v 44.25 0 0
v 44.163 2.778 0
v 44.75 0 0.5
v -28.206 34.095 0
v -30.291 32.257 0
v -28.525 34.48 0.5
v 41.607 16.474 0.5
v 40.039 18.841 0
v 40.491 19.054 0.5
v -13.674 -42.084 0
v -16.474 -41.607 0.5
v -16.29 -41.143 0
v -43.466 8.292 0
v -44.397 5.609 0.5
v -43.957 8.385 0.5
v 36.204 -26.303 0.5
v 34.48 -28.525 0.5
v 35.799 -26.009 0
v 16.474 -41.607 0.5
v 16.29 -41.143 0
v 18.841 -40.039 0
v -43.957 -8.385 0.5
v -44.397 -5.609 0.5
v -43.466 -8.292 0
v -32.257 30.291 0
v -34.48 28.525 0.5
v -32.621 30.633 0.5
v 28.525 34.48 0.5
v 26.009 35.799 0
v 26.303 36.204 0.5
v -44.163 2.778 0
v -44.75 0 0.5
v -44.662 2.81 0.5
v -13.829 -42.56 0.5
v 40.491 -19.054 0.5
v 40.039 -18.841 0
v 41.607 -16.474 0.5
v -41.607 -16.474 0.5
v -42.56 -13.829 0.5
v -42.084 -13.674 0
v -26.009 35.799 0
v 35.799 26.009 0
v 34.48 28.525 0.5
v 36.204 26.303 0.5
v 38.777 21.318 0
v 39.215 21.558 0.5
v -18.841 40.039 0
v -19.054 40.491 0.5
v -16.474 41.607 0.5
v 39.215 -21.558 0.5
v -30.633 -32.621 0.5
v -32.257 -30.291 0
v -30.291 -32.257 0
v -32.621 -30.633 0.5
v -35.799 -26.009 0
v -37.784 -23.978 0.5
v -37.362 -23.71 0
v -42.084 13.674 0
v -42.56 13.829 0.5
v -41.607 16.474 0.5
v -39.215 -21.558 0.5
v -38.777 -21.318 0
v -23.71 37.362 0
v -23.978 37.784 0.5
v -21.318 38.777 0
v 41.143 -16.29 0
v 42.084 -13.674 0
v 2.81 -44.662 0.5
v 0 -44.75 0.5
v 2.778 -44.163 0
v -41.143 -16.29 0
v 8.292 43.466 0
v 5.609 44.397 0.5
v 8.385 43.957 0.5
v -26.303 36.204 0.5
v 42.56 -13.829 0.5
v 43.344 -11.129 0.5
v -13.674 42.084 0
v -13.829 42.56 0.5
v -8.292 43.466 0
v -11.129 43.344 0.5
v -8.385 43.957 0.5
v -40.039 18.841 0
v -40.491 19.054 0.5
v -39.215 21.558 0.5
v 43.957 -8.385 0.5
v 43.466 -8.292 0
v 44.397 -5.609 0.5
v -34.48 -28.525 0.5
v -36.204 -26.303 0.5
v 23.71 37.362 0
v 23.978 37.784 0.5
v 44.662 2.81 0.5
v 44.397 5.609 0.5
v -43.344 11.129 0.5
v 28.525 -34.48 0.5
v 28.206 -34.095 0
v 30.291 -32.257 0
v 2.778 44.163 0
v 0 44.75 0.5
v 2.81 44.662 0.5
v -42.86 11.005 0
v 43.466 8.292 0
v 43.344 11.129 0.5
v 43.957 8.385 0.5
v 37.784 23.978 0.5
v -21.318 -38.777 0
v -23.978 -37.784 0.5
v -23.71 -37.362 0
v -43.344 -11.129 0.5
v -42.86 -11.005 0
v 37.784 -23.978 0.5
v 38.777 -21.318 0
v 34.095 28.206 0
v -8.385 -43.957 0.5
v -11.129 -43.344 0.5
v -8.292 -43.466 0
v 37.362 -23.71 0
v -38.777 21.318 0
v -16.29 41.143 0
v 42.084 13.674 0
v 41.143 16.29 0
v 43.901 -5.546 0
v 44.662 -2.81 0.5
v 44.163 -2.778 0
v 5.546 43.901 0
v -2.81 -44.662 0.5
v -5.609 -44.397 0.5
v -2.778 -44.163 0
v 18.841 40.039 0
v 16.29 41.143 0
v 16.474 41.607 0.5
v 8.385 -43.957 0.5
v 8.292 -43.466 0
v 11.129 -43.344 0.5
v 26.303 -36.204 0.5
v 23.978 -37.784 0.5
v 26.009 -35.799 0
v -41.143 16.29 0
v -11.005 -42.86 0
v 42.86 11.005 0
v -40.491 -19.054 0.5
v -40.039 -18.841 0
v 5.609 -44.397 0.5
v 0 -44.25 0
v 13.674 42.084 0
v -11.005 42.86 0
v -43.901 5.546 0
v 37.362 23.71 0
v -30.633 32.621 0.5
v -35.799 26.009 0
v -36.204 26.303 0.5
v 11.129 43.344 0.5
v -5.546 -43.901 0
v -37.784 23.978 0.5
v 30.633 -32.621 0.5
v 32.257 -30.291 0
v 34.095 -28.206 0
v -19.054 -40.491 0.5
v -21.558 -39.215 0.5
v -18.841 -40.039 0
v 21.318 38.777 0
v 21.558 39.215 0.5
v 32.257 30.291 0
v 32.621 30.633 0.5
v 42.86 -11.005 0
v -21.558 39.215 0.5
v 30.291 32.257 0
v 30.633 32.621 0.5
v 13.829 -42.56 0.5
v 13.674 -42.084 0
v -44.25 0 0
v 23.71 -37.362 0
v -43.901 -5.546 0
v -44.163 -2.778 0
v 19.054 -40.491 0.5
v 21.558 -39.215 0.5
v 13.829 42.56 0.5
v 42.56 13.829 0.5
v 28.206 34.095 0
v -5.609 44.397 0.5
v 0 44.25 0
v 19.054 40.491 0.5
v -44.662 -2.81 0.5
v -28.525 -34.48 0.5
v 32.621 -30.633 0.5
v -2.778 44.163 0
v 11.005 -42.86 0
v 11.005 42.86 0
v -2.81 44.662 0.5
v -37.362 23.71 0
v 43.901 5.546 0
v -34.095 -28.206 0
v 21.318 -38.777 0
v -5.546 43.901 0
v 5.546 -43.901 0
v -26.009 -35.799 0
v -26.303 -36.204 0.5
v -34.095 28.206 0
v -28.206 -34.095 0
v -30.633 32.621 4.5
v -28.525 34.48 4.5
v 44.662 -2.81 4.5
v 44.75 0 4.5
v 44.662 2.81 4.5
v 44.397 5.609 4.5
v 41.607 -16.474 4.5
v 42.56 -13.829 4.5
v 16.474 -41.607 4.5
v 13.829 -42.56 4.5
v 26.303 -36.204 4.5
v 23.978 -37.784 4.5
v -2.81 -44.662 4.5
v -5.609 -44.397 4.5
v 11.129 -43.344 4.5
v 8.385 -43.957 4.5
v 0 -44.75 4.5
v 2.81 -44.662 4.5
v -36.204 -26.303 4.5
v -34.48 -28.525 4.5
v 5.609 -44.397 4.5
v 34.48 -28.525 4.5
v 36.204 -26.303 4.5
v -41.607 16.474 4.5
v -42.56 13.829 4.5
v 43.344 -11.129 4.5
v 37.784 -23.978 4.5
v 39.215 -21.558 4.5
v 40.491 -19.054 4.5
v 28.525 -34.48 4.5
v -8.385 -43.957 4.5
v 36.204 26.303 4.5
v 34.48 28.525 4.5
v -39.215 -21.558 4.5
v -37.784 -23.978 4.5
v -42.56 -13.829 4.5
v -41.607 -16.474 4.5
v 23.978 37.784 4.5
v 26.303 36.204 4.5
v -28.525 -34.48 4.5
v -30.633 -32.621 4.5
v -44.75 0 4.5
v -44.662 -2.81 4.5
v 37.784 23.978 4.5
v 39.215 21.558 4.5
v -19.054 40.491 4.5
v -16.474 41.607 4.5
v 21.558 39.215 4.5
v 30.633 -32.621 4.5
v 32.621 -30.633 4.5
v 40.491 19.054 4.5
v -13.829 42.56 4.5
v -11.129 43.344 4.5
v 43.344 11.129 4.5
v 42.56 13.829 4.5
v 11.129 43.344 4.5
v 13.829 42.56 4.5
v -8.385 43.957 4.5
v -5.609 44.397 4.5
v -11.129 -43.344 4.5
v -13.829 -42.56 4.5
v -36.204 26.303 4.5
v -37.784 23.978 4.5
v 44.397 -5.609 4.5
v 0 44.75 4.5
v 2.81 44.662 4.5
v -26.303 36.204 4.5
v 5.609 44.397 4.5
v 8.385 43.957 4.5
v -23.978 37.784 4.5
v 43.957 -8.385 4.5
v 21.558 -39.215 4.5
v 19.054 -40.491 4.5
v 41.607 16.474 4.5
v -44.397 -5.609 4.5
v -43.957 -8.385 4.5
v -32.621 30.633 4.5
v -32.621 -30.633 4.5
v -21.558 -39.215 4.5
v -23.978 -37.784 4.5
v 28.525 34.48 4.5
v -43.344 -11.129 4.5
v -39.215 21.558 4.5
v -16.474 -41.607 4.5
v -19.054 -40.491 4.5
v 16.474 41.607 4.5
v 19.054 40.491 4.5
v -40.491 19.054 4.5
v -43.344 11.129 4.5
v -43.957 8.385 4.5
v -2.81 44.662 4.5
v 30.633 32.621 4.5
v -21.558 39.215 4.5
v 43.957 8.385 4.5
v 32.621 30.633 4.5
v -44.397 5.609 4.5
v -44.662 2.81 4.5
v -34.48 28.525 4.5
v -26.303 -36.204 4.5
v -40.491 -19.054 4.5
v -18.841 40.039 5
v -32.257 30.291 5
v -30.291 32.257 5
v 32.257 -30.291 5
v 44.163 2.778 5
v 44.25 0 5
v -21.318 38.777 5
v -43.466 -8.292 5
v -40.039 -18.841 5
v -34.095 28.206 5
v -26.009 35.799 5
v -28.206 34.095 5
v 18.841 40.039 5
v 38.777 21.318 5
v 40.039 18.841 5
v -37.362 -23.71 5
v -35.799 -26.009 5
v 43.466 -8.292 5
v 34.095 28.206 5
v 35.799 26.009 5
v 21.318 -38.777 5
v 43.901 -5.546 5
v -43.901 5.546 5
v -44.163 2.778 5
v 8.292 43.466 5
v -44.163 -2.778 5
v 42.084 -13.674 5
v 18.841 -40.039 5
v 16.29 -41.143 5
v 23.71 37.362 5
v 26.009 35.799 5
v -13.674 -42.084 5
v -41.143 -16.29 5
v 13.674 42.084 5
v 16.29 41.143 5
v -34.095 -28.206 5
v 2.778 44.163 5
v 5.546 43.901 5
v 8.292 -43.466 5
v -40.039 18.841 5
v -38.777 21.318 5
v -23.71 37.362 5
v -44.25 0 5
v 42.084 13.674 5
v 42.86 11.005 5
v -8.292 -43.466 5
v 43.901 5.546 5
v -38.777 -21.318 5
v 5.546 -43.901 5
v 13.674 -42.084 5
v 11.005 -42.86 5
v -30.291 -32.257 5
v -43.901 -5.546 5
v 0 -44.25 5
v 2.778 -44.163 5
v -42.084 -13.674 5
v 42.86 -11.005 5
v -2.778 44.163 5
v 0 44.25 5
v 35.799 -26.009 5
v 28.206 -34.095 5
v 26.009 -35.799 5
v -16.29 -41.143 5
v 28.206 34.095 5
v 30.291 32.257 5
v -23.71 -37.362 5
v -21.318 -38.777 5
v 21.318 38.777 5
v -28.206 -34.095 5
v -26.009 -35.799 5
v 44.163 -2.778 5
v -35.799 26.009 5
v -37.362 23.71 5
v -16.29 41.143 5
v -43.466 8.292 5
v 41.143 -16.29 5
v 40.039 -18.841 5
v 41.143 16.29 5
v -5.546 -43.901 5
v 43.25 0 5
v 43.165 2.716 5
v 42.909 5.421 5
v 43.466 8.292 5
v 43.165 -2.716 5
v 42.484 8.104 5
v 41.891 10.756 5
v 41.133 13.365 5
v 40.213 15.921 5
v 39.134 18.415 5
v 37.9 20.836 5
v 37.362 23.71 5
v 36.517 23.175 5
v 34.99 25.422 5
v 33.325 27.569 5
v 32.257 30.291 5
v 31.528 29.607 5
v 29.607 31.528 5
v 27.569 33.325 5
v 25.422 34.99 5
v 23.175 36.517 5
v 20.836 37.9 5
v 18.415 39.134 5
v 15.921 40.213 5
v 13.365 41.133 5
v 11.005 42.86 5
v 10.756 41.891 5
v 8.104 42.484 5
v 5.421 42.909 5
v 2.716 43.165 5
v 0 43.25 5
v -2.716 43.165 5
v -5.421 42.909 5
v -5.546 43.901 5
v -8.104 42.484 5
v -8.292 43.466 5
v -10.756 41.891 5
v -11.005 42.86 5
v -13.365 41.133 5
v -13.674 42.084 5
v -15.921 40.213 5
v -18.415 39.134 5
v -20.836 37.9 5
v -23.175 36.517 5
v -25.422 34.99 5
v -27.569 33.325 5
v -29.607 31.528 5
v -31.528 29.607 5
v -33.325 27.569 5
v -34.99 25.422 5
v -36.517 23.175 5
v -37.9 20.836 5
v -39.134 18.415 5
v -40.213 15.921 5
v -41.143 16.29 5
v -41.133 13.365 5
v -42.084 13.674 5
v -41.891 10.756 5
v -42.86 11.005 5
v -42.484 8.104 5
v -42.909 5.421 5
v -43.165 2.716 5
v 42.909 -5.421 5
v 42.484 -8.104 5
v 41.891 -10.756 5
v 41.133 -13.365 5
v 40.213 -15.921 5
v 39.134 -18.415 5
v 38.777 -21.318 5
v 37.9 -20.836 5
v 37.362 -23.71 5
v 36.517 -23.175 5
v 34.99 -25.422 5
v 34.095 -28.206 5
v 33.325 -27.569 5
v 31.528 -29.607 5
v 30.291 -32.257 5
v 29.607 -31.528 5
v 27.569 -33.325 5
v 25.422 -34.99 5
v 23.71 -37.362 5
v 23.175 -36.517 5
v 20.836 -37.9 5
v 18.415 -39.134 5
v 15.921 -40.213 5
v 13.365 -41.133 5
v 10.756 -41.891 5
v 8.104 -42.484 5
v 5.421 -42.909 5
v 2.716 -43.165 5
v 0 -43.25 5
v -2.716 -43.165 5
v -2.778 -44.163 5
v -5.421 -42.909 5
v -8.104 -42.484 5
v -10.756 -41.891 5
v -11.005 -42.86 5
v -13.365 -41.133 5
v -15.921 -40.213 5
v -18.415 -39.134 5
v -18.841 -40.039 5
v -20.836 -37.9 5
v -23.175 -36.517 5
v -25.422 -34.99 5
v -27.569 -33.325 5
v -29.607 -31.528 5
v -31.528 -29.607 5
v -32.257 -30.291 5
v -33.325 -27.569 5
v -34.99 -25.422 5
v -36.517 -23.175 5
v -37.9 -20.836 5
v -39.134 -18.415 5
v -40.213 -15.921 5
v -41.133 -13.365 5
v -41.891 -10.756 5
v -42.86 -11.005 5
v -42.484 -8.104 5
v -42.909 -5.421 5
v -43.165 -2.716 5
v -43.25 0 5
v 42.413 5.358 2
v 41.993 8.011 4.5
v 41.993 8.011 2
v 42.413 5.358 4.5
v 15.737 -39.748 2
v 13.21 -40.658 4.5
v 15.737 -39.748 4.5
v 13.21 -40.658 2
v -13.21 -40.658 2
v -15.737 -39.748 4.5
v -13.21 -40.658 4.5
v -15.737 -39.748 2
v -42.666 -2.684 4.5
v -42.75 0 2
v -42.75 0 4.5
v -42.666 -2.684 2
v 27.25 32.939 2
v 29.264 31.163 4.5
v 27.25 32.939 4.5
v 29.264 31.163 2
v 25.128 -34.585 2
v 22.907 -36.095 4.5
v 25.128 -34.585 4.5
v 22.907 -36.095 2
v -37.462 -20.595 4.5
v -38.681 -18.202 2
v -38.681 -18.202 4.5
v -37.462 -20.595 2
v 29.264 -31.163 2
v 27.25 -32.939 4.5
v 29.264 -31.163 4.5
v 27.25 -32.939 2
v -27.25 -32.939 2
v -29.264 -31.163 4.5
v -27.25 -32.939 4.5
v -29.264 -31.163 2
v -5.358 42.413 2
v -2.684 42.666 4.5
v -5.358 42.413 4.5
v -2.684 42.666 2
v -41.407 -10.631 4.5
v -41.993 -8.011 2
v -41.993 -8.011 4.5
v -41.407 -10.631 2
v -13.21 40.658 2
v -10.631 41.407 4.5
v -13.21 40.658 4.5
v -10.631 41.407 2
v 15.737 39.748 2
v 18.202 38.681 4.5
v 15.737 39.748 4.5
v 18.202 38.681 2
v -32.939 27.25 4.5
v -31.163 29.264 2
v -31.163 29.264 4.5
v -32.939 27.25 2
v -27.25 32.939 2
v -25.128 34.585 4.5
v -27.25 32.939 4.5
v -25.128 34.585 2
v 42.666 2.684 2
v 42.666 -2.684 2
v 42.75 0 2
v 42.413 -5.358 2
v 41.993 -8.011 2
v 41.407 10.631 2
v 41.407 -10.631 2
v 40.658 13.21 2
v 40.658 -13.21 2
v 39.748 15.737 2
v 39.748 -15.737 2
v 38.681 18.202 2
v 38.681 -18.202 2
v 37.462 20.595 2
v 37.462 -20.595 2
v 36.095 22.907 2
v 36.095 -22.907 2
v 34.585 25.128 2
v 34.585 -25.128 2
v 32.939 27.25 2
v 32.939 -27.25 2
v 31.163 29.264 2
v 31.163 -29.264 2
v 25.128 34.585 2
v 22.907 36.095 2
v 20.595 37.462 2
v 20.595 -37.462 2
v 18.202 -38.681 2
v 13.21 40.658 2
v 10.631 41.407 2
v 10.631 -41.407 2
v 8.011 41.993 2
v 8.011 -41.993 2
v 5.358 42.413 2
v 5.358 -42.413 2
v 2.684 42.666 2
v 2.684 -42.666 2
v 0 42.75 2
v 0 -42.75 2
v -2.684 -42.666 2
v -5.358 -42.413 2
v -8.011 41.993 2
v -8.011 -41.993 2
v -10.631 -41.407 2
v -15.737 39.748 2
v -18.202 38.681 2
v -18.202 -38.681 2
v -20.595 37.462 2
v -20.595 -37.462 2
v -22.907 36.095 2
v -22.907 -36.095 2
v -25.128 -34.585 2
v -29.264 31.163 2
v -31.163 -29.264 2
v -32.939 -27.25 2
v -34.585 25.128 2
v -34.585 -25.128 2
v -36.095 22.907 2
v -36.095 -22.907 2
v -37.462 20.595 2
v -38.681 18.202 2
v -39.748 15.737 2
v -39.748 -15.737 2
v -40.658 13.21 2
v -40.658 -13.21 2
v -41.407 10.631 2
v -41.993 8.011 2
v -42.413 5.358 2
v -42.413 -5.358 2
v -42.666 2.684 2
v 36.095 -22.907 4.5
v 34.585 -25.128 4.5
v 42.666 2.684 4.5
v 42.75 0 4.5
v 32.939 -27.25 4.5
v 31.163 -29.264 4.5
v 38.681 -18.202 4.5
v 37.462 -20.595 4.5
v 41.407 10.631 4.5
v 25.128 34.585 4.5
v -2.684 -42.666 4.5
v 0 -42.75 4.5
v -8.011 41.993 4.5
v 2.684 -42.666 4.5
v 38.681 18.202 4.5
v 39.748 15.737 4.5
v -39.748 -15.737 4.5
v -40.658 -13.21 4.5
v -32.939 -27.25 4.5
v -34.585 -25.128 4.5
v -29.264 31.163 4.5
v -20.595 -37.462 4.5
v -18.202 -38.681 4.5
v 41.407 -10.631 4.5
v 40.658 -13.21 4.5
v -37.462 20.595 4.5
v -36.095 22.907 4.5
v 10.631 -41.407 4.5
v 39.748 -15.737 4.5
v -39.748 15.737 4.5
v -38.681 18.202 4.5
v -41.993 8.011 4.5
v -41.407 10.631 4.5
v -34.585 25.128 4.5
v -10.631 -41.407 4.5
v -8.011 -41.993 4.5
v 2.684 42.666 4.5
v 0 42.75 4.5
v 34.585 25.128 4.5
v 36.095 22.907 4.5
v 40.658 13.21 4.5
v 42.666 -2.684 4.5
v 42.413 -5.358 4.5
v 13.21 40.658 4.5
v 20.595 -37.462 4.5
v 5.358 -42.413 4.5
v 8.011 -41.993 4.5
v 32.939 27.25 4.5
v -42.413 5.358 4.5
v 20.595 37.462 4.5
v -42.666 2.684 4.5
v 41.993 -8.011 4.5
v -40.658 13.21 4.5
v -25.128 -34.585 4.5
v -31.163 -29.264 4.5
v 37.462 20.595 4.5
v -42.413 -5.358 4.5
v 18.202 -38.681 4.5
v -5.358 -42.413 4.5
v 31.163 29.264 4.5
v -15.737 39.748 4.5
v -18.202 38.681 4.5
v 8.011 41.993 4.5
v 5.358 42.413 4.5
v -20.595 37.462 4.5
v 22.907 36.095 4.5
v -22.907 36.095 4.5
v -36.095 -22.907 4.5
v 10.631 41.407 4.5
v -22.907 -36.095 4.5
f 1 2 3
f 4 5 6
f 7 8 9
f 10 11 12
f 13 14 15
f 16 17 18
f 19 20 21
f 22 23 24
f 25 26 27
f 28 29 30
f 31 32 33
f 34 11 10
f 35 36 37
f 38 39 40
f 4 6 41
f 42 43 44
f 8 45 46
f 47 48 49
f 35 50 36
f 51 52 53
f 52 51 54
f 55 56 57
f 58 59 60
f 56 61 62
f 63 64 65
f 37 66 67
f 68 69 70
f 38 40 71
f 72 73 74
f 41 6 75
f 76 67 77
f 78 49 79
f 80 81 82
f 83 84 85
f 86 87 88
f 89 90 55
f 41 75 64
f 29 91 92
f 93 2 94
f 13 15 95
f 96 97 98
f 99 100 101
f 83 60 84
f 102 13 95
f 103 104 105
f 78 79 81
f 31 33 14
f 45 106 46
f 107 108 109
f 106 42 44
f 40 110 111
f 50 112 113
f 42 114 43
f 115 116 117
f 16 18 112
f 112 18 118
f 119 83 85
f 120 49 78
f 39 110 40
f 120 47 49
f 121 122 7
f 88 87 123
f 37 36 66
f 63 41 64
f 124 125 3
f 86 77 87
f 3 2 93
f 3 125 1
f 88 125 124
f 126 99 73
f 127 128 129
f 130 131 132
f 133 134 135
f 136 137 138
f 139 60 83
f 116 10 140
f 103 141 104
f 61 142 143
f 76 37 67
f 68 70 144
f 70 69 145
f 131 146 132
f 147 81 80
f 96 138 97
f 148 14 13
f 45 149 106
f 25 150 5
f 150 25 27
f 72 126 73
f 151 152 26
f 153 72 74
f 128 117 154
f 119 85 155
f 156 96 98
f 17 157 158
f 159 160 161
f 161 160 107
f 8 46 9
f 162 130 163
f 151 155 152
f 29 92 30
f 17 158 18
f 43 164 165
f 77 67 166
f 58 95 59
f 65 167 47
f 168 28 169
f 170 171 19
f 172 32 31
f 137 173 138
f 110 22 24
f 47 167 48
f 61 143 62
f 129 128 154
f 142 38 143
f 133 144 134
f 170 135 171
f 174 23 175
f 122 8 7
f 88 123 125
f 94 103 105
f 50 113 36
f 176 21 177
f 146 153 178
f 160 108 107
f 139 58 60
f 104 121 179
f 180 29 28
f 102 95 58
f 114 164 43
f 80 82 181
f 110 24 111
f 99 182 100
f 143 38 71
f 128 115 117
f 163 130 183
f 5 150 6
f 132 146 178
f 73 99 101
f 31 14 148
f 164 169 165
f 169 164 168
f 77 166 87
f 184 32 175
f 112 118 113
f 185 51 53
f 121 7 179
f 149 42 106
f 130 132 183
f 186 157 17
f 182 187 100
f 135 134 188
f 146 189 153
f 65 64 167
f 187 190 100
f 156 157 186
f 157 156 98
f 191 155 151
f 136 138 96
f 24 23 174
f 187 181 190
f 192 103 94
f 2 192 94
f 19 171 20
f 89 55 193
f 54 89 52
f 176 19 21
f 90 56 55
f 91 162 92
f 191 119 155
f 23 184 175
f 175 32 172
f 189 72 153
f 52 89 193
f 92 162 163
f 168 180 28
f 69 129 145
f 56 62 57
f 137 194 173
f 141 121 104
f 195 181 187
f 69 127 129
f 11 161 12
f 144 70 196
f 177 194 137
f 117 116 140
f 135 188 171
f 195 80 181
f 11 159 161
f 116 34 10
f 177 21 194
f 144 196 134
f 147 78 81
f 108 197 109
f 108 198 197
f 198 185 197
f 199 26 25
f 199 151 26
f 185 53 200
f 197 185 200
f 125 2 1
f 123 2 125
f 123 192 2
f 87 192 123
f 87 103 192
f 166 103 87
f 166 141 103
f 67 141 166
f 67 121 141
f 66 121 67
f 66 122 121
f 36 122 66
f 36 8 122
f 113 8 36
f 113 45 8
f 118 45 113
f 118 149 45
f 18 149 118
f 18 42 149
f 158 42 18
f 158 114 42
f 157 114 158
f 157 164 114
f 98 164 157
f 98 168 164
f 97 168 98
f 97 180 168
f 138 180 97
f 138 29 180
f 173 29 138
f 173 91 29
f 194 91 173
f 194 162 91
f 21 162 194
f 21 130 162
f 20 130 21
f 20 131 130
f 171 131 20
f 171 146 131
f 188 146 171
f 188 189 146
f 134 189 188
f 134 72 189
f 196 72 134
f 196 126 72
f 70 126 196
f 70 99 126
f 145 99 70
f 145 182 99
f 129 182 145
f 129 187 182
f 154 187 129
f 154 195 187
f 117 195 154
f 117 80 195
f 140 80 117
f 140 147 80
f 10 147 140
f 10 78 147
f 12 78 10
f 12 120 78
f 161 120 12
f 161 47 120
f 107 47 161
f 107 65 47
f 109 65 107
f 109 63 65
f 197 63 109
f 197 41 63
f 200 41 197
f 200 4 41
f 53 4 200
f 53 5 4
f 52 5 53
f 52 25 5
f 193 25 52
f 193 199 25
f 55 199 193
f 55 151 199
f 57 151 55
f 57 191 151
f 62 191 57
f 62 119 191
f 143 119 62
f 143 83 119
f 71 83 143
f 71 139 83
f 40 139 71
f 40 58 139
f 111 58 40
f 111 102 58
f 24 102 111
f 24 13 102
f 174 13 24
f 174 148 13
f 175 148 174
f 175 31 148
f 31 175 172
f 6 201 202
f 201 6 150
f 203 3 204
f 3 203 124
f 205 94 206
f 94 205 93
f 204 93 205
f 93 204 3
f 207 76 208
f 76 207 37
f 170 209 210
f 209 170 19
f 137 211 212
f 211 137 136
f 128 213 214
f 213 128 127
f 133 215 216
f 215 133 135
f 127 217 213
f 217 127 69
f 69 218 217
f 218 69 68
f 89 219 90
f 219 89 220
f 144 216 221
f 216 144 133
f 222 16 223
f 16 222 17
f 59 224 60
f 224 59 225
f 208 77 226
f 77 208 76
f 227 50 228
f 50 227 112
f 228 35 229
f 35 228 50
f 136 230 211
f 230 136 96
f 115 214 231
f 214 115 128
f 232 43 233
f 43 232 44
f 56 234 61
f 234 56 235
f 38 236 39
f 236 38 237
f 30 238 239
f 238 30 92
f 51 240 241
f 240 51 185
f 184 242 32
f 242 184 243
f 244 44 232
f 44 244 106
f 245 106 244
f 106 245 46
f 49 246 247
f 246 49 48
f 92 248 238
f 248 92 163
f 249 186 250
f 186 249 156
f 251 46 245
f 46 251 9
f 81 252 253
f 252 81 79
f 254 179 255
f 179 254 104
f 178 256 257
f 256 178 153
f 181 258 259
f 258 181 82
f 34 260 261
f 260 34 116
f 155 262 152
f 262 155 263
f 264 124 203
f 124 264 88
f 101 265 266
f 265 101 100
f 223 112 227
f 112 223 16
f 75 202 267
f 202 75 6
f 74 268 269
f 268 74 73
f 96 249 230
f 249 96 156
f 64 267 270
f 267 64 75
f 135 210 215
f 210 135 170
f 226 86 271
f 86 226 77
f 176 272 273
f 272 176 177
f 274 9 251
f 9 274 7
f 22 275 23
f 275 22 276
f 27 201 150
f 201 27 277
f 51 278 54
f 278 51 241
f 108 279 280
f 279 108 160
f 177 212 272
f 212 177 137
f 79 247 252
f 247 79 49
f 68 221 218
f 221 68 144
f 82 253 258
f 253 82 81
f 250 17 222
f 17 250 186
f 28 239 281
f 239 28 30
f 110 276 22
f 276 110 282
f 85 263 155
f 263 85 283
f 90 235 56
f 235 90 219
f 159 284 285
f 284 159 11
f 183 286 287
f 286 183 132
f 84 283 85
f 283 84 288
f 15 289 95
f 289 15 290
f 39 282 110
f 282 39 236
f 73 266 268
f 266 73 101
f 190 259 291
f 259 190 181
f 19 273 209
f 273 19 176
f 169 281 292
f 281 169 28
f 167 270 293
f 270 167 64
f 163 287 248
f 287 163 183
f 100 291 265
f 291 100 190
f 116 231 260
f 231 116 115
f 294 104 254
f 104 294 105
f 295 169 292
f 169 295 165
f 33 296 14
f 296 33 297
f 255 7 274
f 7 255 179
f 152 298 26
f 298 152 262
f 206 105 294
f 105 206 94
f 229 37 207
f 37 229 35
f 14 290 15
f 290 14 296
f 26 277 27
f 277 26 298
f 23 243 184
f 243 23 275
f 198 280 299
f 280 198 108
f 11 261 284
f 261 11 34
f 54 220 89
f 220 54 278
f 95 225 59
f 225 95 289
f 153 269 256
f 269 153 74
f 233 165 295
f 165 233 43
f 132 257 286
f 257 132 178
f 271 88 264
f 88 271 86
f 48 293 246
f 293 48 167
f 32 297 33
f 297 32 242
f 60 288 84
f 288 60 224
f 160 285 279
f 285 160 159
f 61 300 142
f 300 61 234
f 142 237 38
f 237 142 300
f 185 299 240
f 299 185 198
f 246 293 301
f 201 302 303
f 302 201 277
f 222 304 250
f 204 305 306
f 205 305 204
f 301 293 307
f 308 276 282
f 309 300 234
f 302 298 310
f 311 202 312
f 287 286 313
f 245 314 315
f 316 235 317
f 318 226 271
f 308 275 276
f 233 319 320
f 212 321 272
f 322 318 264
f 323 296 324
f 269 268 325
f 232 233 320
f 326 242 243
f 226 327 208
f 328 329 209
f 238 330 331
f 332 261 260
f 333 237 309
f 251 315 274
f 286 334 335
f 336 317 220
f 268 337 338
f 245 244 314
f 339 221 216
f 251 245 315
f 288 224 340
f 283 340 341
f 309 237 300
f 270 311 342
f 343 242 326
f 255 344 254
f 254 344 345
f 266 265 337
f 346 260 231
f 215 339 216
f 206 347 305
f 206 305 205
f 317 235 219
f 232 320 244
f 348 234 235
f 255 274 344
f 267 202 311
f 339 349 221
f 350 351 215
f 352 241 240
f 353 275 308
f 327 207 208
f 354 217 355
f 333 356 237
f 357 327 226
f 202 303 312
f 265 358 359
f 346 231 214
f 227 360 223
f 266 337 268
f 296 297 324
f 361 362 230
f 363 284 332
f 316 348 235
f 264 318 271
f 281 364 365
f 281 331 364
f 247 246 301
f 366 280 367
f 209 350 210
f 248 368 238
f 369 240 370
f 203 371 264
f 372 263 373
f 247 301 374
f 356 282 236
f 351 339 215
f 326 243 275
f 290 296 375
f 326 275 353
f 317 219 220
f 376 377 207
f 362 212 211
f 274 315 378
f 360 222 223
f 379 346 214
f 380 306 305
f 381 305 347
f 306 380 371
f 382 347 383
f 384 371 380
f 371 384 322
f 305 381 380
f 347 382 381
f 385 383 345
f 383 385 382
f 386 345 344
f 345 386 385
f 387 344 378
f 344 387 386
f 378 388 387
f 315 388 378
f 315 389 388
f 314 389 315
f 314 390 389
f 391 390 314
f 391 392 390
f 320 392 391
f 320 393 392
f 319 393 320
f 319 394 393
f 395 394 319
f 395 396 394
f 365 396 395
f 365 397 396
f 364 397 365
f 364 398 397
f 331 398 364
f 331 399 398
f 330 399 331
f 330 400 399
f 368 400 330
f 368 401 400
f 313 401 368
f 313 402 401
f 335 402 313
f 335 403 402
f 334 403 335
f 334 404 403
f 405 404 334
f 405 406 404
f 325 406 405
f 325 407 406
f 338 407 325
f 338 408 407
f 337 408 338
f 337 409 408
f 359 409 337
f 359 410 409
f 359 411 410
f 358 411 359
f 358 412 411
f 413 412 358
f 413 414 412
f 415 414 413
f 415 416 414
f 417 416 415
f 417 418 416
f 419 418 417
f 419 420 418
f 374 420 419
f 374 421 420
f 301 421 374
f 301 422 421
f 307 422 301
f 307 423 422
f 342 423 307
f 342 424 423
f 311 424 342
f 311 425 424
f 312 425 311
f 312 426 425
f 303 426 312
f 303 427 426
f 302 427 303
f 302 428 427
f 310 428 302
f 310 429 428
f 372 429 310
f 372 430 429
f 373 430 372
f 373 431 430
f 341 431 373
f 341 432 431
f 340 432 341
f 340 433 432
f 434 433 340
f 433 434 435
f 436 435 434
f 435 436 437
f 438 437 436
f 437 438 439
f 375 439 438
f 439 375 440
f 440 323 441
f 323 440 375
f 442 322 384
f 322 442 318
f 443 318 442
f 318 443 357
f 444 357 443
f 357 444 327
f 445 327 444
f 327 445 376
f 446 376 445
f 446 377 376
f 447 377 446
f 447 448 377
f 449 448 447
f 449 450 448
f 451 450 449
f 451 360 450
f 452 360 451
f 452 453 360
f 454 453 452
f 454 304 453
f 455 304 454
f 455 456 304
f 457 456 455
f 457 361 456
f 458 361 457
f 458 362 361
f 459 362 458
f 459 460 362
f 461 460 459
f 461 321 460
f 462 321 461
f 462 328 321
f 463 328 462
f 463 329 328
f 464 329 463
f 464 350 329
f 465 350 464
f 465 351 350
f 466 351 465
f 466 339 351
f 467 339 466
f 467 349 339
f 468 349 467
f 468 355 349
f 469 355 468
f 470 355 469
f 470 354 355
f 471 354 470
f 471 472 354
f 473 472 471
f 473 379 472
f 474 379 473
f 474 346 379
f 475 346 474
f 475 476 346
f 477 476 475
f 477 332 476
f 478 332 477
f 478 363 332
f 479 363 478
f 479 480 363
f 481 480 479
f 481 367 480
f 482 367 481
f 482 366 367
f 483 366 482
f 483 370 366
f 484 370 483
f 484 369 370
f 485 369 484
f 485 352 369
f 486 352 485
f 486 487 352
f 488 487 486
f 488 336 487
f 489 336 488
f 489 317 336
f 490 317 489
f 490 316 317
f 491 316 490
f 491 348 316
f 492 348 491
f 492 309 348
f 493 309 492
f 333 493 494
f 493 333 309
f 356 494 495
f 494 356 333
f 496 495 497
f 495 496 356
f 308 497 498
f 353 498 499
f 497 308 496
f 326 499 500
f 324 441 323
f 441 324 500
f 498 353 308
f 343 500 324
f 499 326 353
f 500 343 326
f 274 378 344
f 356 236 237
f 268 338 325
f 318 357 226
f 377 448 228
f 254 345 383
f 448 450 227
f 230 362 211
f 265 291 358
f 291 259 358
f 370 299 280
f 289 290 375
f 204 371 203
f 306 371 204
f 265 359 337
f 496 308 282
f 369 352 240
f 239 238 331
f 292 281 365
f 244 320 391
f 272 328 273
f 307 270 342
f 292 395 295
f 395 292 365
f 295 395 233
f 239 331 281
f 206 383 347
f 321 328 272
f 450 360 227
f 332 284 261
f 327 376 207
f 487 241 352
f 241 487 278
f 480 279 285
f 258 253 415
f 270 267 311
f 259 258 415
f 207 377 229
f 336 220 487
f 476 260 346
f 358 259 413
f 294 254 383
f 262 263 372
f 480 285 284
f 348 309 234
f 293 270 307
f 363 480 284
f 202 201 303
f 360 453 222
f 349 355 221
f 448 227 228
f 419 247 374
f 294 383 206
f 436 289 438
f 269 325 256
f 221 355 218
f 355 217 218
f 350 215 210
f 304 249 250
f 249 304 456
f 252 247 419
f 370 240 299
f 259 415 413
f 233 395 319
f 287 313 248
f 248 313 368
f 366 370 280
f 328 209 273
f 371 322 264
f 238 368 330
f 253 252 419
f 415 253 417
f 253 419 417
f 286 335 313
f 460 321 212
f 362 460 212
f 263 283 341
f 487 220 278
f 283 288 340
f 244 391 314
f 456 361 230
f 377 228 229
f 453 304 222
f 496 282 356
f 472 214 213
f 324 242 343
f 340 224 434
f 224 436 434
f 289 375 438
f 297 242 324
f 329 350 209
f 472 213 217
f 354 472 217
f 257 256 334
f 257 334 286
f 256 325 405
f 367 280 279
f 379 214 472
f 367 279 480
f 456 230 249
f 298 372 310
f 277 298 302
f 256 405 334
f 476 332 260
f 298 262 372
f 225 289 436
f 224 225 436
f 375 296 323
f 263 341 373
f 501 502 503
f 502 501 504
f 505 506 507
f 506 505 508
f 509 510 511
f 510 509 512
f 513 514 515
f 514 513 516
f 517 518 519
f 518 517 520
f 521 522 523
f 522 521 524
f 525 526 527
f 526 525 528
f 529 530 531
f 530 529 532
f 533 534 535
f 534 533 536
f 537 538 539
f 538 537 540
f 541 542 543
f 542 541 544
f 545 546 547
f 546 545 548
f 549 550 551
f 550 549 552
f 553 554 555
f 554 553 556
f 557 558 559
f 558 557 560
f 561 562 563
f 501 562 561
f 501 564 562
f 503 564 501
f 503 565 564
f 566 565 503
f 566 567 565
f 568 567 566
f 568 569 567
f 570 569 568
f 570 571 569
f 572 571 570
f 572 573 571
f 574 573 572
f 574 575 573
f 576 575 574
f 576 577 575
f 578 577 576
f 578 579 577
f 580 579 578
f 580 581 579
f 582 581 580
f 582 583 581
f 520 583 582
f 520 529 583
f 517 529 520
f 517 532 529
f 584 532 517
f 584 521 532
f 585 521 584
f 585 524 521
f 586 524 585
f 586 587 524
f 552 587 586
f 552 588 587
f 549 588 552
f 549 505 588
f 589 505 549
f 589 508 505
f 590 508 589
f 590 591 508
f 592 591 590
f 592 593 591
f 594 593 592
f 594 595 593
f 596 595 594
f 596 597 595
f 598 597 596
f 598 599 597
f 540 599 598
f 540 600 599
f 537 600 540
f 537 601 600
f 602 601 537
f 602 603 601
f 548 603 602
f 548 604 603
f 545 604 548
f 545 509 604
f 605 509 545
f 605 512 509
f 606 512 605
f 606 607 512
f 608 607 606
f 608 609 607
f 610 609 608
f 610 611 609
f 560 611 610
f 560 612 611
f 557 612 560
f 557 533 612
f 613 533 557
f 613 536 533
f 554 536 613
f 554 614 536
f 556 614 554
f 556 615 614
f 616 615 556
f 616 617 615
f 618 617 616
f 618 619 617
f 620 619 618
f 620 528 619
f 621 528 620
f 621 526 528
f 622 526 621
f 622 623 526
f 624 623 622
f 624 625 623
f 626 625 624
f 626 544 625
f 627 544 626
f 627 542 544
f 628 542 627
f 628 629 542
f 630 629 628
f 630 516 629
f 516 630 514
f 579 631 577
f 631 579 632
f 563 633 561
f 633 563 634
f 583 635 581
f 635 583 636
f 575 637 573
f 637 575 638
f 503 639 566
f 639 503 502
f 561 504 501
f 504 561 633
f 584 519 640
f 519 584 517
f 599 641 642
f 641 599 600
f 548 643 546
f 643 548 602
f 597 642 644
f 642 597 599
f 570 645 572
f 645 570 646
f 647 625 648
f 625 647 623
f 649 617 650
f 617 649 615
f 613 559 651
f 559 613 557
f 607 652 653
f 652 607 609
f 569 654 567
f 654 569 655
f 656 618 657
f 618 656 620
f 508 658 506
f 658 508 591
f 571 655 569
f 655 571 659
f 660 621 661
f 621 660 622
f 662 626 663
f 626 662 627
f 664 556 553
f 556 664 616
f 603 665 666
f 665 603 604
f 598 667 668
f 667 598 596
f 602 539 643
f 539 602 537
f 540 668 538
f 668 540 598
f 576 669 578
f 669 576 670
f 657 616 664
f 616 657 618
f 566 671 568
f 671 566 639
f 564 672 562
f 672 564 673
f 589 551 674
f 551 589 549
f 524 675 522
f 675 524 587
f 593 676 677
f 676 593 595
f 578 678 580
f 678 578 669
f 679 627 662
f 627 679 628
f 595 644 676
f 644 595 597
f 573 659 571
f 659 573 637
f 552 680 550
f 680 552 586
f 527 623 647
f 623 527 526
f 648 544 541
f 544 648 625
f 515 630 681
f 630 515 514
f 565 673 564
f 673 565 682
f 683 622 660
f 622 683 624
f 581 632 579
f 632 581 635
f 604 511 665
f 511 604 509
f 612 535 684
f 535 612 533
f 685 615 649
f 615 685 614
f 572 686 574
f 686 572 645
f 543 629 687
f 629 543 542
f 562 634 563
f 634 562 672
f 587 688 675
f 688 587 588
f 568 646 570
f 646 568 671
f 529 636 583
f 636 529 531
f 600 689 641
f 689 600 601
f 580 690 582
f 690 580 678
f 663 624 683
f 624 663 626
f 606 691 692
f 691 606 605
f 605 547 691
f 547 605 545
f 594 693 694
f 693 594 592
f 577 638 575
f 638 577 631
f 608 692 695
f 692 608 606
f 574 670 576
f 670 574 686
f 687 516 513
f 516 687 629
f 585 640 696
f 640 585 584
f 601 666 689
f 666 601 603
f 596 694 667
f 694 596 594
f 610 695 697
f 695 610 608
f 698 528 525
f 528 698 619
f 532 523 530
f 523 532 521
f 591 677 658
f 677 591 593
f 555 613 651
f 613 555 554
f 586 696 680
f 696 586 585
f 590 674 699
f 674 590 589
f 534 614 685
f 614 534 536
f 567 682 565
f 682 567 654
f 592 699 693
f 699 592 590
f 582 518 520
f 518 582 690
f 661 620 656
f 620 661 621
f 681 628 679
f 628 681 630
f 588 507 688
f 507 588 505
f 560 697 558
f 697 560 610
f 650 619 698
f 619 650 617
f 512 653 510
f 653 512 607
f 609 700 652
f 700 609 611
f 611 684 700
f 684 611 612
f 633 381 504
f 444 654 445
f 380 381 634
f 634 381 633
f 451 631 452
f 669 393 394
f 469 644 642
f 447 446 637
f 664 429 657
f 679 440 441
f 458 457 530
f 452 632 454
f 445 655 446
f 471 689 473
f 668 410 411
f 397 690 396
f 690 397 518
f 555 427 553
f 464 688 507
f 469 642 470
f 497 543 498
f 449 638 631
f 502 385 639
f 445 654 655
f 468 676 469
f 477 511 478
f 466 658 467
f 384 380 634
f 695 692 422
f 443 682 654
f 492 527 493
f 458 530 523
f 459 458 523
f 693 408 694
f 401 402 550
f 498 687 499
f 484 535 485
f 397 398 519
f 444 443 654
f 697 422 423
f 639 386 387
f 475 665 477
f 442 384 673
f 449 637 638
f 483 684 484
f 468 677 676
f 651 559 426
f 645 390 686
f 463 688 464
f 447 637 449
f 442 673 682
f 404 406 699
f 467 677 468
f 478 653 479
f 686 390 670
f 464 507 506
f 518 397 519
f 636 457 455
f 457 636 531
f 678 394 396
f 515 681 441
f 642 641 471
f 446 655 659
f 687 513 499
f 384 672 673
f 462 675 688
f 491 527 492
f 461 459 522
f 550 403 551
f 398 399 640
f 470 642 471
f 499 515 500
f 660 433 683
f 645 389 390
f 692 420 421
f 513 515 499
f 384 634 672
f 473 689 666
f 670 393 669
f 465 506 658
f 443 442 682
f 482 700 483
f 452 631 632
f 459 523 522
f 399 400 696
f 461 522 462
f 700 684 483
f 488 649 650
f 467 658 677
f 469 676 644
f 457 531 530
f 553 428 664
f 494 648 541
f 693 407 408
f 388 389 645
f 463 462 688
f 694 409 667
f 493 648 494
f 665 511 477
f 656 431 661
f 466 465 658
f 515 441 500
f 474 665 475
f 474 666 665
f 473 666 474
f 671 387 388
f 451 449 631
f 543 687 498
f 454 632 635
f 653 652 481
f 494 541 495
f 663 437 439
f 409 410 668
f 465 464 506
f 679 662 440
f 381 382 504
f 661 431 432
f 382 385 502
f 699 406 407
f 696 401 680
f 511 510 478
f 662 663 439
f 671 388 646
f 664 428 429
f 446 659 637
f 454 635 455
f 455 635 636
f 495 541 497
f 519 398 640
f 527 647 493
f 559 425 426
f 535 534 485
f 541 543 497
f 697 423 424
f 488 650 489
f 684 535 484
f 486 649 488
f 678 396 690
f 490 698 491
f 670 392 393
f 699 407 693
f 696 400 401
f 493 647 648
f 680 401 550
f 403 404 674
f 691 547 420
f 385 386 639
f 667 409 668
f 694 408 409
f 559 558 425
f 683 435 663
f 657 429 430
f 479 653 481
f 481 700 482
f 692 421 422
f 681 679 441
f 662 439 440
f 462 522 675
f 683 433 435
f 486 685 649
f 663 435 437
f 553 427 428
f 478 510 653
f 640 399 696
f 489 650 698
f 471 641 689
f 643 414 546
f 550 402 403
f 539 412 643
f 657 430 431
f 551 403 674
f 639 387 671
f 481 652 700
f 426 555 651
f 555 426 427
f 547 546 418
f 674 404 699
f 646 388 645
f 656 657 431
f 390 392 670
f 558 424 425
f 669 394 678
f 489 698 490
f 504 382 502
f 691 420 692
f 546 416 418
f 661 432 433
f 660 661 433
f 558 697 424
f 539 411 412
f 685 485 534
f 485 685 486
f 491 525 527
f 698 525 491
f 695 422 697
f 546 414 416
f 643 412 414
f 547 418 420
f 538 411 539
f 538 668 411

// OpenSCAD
// Oil-Bottle-Base.scad
// Version: v0.02
// Description: Parametric base to protect tables from oil bottle drips with chamfered edges.

/* [Bottle Dimensions] */
// Diameter of the oil bottle
bottle_diameter = 85;
// Extra space around the bottle for easy placement
clearance = 0.5;

/* [Base Dimensions] */
// Thickness of the walls and the bottom
wall_thickness = 2.0;
// Total height of the base tray
base_height = 5.0;
// Size of the chamfers for edges
chamfer = 0.5;

/* [Rendering] */
// Quality of curves (higher = smoother)
$fn = 100;

// Derived calculations
inner_diameter = bottle_diameter + clearance;
outer_diameter = inner_diameter + (2 * wall_thickness);

module oil_bottle_base() {
    difference() {
        // Outer Body
        union() {
            // Bottom outer chamfer
            cylinder(h = chamfer, d1 = outer_diameter - 2 * chamfer, d2 = outer_diameter);

            // Main middle section
            translate([0, 0, chamfer])
                cylinder(h = base_height - 2 * chamfer, d = outer_diameter);

            // Top outer chamfer
            translate([0, 0, base_height - chamfer])
                cylinder(h = chamfer, d1 = outer_diameter, d2 = outer_diameter - 2 * chamfer);
        }

        // Inner Cutout
        union() {
            // Main inner hole
            translate([0, 0, wall_thickness])
                cylinder(h = base_height - wall_thickness - chamfer, d = inner_diameter);

            // Top inner chamfer (to match the outer top chamfer)
            translate([0, 0, base_height - chamfer])
                cylinder(h = chamfer, d1 = inner_diameter, d2 = inner_diameter + 2 * chamfer);
        }
    }
}

// Render the base
oil_bottle_base();
